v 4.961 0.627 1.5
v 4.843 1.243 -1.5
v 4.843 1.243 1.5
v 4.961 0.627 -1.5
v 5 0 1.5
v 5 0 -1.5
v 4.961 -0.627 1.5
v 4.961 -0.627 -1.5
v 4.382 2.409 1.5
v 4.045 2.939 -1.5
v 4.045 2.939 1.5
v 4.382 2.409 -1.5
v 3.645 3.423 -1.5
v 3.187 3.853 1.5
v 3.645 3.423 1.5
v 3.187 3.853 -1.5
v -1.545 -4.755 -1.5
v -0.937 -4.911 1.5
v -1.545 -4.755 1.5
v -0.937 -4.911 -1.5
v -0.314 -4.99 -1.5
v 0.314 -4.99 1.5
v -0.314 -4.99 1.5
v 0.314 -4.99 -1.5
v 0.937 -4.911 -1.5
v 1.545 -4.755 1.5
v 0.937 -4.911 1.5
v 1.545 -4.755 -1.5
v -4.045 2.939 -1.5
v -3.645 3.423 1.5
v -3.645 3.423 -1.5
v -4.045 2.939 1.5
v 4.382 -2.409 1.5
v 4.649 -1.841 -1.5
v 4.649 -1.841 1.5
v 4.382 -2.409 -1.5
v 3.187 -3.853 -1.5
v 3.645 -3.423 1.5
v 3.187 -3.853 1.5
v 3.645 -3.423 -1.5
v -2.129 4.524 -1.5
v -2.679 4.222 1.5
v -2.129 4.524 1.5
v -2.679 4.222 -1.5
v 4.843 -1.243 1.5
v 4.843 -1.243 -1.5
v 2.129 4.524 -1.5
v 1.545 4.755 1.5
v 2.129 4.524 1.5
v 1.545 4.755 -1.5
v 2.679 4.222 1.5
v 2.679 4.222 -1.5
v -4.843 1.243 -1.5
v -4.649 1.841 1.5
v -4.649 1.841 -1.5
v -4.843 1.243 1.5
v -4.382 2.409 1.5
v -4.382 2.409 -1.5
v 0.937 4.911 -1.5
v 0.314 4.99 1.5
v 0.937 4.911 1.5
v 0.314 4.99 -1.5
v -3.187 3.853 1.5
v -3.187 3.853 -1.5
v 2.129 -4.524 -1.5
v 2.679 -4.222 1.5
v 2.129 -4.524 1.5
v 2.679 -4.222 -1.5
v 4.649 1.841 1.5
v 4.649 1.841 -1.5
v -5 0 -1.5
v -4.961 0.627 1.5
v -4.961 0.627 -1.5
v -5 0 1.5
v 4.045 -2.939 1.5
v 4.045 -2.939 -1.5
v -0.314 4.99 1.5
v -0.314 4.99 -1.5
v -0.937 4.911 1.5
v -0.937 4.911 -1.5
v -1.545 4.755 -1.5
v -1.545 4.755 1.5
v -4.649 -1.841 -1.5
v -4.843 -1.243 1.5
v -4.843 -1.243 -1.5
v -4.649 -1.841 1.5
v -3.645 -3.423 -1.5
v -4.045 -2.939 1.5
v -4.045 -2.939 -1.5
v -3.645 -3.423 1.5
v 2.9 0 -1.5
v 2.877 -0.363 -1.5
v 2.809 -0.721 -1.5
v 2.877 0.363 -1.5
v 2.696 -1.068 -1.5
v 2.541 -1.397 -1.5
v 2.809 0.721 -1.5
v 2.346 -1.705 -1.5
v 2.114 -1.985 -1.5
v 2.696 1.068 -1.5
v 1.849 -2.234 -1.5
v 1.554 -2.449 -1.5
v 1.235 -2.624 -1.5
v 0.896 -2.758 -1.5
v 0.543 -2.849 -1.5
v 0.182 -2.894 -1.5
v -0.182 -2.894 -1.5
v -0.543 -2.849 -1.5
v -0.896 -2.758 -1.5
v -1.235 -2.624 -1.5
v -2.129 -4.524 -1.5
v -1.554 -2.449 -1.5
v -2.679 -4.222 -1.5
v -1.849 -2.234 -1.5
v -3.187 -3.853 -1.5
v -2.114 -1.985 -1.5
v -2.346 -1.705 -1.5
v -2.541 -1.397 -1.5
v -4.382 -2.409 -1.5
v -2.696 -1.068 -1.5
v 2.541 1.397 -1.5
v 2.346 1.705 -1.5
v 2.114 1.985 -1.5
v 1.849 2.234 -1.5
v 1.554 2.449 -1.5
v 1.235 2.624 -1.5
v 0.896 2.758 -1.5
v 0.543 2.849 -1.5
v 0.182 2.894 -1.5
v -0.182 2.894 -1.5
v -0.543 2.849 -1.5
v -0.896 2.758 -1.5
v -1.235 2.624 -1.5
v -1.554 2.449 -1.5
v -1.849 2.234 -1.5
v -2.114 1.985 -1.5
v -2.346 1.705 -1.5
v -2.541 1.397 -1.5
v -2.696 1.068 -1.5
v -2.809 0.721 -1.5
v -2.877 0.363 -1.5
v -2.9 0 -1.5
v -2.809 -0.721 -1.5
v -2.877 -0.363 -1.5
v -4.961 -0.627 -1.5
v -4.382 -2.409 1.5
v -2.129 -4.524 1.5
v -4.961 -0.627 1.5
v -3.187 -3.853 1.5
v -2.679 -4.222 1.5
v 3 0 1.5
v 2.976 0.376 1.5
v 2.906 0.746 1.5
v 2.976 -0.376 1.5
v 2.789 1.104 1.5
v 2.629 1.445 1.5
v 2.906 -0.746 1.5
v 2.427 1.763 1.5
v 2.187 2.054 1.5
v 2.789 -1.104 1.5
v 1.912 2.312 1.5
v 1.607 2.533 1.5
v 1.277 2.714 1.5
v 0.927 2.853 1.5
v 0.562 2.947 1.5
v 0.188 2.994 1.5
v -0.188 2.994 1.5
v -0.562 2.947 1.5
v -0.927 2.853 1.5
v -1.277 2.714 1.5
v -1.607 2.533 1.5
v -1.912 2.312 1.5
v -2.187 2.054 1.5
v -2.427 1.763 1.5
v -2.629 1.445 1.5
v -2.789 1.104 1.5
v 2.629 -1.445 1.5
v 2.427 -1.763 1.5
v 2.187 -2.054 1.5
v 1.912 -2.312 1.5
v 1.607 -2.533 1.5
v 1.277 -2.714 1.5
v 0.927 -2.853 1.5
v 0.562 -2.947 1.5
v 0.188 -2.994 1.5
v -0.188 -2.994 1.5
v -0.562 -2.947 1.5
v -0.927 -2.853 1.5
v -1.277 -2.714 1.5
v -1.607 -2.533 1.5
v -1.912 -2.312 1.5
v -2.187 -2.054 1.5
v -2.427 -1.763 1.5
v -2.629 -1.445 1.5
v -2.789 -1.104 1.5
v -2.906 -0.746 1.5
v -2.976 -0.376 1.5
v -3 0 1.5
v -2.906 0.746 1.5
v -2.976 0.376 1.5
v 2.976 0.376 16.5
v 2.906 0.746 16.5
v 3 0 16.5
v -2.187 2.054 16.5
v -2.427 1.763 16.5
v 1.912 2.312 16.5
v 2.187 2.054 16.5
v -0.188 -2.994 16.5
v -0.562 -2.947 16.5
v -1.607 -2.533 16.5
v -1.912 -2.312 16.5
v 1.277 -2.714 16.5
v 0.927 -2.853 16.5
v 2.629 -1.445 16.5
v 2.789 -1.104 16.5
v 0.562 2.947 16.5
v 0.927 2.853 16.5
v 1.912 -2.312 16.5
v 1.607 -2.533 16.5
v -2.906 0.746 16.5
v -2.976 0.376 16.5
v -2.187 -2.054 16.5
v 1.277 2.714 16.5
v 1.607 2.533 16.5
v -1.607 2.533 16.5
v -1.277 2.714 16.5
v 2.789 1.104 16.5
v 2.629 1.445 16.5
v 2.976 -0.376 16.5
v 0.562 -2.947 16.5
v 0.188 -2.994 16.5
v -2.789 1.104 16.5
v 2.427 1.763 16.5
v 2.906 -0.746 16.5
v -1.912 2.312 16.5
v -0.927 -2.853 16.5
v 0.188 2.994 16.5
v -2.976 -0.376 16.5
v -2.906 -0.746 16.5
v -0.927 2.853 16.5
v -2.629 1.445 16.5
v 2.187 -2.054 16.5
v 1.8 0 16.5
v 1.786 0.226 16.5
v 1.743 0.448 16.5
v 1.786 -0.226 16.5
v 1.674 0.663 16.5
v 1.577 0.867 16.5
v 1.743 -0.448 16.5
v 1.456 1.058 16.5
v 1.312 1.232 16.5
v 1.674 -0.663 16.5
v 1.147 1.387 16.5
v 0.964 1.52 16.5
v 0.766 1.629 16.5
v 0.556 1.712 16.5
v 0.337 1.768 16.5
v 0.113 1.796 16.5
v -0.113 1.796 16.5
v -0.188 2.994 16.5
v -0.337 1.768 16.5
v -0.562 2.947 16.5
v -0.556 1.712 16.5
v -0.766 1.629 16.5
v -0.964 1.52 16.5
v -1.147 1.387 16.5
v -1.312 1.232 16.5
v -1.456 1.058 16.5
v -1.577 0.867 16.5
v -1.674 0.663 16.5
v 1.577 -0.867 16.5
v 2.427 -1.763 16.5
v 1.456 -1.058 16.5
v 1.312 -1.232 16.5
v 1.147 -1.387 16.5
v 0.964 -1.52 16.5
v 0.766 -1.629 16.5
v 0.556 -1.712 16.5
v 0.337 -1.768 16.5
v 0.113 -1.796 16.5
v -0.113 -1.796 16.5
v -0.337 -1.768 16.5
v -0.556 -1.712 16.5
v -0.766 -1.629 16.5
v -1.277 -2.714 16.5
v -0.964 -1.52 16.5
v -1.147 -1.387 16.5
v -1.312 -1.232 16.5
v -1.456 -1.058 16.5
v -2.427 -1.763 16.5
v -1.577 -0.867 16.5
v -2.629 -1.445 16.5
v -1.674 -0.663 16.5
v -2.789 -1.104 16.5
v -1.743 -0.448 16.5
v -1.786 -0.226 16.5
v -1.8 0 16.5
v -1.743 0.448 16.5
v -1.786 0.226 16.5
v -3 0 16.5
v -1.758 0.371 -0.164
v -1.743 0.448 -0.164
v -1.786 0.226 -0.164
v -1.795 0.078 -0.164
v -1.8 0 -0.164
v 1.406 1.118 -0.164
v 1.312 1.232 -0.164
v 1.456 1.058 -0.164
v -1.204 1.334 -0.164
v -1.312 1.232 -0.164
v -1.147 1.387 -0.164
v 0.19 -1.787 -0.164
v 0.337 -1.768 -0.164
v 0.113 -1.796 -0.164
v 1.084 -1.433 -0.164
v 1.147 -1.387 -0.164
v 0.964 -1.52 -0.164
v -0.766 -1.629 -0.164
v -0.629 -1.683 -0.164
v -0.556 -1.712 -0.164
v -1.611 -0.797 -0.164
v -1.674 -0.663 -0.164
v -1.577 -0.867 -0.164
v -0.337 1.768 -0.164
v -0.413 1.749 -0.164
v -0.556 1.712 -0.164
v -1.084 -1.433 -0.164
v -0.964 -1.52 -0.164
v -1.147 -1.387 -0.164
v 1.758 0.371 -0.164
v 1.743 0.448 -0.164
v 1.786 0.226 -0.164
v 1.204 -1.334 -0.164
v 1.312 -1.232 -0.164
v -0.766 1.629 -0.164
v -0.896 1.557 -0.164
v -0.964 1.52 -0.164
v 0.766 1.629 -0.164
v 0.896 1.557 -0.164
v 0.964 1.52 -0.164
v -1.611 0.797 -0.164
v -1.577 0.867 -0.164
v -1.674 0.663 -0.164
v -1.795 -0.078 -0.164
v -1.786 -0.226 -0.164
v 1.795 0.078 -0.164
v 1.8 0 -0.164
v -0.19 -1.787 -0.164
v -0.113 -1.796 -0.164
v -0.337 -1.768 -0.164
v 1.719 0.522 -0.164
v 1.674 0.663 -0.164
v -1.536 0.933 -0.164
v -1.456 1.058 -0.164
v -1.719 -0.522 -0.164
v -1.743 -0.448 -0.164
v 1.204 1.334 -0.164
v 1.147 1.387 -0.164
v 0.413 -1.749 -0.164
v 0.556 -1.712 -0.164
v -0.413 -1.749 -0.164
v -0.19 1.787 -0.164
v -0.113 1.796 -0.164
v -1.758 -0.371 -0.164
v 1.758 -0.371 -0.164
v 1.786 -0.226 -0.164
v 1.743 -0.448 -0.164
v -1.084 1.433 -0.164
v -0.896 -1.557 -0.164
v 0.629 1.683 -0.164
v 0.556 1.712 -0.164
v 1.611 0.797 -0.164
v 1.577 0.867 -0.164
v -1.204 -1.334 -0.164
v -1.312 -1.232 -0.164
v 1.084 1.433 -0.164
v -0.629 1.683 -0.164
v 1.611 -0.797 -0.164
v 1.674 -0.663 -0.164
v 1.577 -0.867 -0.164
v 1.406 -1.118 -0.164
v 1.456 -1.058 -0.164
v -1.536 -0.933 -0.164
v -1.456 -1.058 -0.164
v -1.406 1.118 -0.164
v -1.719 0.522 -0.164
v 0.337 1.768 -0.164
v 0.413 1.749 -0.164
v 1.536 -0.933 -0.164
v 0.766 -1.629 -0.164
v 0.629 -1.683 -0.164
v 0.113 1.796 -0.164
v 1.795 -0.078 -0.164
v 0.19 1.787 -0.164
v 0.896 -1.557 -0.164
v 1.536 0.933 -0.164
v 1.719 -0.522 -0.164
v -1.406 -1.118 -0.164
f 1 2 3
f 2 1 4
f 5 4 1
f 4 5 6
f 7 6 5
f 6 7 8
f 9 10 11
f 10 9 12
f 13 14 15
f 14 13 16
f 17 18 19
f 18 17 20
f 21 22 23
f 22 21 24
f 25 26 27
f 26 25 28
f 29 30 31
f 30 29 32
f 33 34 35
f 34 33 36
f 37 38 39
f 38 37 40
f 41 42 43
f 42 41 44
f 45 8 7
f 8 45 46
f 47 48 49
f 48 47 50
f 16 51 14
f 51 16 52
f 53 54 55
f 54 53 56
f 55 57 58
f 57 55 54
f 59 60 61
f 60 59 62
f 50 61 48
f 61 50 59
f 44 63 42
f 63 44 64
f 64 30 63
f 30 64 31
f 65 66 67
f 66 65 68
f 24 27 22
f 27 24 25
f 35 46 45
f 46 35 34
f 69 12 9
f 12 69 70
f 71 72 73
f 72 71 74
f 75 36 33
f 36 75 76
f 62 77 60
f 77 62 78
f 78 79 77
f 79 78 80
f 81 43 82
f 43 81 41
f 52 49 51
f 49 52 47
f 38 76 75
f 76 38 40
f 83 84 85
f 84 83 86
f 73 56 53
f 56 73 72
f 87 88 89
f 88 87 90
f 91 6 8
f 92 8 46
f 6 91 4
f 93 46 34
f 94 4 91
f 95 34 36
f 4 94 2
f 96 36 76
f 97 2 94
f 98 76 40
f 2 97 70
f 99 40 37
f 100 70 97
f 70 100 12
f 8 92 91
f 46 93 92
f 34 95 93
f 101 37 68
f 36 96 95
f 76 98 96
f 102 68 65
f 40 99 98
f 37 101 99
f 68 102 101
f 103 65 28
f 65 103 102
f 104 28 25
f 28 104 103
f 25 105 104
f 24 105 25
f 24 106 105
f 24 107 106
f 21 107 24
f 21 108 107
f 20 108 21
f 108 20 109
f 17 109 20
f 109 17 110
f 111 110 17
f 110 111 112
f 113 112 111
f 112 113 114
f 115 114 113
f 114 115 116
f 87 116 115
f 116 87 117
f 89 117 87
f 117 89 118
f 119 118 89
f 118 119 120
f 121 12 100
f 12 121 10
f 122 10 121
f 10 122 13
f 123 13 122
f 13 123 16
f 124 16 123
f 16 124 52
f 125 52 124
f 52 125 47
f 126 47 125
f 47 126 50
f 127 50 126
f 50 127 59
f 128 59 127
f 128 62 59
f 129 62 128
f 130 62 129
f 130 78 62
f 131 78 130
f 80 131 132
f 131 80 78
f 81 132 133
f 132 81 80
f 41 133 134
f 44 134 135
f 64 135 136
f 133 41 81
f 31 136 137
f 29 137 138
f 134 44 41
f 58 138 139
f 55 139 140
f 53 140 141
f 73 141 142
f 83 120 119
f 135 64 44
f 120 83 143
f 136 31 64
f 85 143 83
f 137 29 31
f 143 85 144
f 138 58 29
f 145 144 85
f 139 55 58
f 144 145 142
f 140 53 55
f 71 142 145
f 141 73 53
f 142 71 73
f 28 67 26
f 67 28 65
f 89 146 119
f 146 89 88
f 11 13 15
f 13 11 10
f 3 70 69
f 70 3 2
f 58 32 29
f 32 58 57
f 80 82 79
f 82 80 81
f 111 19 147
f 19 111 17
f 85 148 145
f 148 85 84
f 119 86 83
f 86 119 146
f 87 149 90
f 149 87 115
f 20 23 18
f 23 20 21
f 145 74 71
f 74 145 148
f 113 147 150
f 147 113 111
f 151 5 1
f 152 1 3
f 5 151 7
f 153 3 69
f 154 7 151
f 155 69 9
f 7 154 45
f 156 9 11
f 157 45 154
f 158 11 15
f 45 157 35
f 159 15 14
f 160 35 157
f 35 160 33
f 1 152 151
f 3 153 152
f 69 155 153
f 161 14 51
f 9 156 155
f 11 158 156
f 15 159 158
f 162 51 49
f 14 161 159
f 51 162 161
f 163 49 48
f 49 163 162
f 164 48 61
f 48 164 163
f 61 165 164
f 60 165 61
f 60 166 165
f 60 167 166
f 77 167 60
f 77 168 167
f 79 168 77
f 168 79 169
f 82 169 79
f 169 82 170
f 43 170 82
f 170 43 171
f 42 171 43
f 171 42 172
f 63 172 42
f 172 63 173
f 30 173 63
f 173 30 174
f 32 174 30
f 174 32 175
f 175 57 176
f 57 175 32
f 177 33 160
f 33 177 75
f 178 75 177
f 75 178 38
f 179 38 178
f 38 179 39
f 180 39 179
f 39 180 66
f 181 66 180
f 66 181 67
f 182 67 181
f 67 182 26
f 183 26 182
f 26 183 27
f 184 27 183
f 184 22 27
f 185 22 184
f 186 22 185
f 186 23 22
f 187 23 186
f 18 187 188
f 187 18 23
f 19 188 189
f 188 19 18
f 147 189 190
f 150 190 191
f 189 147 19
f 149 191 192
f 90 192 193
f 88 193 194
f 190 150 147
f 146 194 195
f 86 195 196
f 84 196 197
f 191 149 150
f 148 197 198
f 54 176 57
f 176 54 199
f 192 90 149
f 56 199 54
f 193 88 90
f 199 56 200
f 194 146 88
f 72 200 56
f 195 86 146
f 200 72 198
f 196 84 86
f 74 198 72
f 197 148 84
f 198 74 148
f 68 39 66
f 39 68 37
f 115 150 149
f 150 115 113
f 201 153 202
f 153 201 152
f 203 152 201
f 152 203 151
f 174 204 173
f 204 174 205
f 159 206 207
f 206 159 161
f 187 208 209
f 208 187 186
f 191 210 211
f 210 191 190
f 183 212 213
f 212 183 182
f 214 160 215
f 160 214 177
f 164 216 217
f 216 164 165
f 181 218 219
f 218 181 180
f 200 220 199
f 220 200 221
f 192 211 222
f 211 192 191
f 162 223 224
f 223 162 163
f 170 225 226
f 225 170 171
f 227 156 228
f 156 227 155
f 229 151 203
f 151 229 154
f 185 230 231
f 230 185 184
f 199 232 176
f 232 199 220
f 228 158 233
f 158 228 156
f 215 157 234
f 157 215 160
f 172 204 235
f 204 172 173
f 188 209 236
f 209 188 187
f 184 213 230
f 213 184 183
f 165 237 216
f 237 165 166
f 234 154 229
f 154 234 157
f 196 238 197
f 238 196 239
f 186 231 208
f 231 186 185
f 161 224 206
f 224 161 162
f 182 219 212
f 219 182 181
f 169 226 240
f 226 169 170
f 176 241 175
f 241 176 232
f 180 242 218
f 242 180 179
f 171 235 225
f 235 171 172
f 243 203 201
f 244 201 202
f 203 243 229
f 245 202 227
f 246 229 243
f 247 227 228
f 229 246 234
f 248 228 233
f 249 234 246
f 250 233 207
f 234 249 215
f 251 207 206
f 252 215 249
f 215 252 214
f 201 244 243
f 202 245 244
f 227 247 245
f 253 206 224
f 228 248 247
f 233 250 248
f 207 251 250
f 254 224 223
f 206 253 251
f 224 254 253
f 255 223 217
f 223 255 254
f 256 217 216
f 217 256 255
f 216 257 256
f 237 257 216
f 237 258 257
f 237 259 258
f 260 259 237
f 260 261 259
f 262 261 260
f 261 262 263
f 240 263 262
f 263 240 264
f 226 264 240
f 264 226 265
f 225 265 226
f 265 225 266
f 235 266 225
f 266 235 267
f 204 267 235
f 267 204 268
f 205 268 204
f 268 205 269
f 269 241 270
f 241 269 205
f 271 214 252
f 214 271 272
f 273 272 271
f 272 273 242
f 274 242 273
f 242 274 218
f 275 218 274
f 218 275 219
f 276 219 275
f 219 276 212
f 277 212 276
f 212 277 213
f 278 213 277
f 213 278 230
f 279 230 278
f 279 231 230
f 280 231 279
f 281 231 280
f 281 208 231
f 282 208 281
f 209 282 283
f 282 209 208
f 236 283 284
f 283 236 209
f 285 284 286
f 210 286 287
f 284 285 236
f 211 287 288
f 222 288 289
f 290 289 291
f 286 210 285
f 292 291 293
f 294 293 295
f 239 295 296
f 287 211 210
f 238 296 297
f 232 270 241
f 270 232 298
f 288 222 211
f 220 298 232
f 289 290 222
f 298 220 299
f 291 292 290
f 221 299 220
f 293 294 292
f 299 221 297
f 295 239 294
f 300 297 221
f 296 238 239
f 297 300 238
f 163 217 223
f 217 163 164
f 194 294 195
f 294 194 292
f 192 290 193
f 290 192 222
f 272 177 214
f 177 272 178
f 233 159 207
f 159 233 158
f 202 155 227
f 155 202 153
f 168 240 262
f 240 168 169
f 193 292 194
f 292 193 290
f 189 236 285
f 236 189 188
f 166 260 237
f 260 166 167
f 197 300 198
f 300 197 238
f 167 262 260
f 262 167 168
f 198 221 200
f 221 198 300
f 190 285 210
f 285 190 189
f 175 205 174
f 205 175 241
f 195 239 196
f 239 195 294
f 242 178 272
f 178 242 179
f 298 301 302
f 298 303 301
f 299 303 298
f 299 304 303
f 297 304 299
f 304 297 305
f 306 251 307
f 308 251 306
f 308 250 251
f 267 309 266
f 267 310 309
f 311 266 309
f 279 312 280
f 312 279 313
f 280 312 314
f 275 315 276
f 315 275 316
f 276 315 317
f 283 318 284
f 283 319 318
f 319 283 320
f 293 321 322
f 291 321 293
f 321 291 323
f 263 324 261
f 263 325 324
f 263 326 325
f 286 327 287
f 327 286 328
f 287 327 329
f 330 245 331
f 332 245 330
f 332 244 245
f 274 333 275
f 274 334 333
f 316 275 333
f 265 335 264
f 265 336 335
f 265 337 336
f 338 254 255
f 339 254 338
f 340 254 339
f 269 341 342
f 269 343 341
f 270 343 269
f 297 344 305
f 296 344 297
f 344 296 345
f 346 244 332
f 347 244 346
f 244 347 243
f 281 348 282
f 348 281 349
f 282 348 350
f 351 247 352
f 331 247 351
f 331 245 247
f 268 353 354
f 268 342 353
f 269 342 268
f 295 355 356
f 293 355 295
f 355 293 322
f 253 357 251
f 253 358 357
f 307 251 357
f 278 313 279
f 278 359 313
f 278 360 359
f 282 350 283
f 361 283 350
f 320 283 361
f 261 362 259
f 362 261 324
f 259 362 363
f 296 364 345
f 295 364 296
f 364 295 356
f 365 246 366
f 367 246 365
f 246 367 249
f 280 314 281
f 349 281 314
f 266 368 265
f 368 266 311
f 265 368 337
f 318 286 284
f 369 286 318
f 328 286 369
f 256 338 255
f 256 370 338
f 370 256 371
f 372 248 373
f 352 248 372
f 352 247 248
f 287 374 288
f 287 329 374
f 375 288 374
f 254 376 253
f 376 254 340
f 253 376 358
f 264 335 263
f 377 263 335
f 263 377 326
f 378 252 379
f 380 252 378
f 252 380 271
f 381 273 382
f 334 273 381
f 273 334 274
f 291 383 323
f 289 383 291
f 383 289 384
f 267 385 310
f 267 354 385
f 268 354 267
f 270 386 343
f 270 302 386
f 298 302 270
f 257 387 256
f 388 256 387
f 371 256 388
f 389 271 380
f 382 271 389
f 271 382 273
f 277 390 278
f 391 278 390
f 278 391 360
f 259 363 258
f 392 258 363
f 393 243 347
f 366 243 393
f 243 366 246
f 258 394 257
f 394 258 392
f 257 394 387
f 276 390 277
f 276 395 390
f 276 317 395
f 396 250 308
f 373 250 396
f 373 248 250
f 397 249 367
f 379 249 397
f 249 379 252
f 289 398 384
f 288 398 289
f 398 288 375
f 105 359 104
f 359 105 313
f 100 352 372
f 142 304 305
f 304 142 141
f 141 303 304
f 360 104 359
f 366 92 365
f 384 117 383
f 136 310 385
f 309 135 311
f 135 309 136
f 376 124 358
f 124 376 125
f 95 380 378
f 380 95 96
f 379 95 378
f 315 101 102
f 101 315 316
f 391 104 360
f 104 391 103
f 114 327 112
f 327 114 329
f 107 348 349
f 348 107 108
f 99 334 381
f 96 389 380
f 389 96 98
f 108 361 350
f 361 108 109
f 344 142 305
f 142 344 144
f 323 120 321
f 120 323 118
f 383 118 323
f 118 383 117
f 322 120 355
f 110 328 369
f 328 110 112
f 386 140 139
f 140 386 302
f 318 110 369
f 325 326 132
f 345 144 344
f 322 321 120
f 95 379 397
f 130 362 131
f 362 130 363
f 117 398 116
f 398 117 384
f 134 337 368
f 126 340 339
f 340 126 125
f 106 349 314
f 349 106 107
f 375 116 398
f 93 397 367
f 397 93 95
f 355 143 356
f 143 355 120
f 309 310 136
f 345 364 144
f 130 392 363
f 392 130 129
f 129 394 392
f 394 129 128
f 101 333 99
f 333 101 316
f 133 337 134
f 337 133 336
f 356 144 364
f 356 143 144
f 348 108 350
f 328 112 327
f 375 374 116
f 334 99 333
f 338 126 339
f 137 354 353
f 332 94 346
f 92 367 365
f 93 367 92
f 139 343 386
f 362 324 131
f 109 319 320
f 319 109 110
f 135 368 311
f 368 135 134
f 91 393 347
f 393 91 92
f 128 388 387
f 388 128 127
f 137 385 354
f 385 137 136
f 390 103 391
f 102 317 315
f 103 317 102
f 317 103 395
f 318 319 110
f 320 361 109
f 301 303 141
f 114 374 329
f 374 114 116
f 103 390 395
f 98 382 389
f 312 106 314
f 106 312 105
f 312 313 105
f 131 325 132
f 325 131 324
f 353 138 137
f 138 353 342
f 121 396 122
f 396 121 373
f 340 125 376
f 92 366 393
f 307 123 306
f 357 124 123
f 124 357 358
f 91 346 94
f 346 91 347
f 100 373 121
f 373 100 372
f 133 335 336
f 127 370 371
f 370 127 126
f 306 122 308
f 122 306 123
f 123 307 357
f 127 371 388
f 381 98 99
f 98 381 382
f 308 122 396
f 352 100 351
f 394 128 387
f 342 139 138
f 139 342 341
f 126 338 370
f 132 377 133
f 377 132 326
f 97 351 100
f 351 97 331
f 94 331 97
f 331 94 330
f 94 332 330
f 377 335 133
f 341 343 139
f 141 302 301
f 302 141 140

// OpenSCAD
$fn = 50;


difference() {
	union() {
		translate(v = [0, 0, -1.5000000000]) {
			cylinder(h = 3, r = 5.0000000000);
		}
		translate(v = [0, 0, -1.5000000000]) {
			cylinder(h = 18, r = 3.0000000000);
		}
	}
	union() {
		translate(v = [0, 0, -1.5000000000]) {
			rotate(a = [0, 180, 0]) {
				difference() {
					union() {
						translate(v = [0, 0, -18.0000000000]) {
							cylinder(h = 18, r = 1.5000000000);
						}
						translate(v = [0, 0, -18.0000000000]) {
							cylinder(h = 18, r = 1.8000000000);
						}
						translate(v = [0, 0, -1.7000000000]) {
							cylinder(h = 1.7000000000, r1 = 1.5000000000, r2 = 2.9000000000);
						}
						translate(v = [0, 0, -18.0000000000]) {
							cylinder(h = 18, r = 1.5000000000);
						}
					}
					union();
				}
			}
		}
		translate(v = [0, 0, -100.0000000000]) {
			cylinder(h = 200, r = 1.5000000000);
		}
	}
}
